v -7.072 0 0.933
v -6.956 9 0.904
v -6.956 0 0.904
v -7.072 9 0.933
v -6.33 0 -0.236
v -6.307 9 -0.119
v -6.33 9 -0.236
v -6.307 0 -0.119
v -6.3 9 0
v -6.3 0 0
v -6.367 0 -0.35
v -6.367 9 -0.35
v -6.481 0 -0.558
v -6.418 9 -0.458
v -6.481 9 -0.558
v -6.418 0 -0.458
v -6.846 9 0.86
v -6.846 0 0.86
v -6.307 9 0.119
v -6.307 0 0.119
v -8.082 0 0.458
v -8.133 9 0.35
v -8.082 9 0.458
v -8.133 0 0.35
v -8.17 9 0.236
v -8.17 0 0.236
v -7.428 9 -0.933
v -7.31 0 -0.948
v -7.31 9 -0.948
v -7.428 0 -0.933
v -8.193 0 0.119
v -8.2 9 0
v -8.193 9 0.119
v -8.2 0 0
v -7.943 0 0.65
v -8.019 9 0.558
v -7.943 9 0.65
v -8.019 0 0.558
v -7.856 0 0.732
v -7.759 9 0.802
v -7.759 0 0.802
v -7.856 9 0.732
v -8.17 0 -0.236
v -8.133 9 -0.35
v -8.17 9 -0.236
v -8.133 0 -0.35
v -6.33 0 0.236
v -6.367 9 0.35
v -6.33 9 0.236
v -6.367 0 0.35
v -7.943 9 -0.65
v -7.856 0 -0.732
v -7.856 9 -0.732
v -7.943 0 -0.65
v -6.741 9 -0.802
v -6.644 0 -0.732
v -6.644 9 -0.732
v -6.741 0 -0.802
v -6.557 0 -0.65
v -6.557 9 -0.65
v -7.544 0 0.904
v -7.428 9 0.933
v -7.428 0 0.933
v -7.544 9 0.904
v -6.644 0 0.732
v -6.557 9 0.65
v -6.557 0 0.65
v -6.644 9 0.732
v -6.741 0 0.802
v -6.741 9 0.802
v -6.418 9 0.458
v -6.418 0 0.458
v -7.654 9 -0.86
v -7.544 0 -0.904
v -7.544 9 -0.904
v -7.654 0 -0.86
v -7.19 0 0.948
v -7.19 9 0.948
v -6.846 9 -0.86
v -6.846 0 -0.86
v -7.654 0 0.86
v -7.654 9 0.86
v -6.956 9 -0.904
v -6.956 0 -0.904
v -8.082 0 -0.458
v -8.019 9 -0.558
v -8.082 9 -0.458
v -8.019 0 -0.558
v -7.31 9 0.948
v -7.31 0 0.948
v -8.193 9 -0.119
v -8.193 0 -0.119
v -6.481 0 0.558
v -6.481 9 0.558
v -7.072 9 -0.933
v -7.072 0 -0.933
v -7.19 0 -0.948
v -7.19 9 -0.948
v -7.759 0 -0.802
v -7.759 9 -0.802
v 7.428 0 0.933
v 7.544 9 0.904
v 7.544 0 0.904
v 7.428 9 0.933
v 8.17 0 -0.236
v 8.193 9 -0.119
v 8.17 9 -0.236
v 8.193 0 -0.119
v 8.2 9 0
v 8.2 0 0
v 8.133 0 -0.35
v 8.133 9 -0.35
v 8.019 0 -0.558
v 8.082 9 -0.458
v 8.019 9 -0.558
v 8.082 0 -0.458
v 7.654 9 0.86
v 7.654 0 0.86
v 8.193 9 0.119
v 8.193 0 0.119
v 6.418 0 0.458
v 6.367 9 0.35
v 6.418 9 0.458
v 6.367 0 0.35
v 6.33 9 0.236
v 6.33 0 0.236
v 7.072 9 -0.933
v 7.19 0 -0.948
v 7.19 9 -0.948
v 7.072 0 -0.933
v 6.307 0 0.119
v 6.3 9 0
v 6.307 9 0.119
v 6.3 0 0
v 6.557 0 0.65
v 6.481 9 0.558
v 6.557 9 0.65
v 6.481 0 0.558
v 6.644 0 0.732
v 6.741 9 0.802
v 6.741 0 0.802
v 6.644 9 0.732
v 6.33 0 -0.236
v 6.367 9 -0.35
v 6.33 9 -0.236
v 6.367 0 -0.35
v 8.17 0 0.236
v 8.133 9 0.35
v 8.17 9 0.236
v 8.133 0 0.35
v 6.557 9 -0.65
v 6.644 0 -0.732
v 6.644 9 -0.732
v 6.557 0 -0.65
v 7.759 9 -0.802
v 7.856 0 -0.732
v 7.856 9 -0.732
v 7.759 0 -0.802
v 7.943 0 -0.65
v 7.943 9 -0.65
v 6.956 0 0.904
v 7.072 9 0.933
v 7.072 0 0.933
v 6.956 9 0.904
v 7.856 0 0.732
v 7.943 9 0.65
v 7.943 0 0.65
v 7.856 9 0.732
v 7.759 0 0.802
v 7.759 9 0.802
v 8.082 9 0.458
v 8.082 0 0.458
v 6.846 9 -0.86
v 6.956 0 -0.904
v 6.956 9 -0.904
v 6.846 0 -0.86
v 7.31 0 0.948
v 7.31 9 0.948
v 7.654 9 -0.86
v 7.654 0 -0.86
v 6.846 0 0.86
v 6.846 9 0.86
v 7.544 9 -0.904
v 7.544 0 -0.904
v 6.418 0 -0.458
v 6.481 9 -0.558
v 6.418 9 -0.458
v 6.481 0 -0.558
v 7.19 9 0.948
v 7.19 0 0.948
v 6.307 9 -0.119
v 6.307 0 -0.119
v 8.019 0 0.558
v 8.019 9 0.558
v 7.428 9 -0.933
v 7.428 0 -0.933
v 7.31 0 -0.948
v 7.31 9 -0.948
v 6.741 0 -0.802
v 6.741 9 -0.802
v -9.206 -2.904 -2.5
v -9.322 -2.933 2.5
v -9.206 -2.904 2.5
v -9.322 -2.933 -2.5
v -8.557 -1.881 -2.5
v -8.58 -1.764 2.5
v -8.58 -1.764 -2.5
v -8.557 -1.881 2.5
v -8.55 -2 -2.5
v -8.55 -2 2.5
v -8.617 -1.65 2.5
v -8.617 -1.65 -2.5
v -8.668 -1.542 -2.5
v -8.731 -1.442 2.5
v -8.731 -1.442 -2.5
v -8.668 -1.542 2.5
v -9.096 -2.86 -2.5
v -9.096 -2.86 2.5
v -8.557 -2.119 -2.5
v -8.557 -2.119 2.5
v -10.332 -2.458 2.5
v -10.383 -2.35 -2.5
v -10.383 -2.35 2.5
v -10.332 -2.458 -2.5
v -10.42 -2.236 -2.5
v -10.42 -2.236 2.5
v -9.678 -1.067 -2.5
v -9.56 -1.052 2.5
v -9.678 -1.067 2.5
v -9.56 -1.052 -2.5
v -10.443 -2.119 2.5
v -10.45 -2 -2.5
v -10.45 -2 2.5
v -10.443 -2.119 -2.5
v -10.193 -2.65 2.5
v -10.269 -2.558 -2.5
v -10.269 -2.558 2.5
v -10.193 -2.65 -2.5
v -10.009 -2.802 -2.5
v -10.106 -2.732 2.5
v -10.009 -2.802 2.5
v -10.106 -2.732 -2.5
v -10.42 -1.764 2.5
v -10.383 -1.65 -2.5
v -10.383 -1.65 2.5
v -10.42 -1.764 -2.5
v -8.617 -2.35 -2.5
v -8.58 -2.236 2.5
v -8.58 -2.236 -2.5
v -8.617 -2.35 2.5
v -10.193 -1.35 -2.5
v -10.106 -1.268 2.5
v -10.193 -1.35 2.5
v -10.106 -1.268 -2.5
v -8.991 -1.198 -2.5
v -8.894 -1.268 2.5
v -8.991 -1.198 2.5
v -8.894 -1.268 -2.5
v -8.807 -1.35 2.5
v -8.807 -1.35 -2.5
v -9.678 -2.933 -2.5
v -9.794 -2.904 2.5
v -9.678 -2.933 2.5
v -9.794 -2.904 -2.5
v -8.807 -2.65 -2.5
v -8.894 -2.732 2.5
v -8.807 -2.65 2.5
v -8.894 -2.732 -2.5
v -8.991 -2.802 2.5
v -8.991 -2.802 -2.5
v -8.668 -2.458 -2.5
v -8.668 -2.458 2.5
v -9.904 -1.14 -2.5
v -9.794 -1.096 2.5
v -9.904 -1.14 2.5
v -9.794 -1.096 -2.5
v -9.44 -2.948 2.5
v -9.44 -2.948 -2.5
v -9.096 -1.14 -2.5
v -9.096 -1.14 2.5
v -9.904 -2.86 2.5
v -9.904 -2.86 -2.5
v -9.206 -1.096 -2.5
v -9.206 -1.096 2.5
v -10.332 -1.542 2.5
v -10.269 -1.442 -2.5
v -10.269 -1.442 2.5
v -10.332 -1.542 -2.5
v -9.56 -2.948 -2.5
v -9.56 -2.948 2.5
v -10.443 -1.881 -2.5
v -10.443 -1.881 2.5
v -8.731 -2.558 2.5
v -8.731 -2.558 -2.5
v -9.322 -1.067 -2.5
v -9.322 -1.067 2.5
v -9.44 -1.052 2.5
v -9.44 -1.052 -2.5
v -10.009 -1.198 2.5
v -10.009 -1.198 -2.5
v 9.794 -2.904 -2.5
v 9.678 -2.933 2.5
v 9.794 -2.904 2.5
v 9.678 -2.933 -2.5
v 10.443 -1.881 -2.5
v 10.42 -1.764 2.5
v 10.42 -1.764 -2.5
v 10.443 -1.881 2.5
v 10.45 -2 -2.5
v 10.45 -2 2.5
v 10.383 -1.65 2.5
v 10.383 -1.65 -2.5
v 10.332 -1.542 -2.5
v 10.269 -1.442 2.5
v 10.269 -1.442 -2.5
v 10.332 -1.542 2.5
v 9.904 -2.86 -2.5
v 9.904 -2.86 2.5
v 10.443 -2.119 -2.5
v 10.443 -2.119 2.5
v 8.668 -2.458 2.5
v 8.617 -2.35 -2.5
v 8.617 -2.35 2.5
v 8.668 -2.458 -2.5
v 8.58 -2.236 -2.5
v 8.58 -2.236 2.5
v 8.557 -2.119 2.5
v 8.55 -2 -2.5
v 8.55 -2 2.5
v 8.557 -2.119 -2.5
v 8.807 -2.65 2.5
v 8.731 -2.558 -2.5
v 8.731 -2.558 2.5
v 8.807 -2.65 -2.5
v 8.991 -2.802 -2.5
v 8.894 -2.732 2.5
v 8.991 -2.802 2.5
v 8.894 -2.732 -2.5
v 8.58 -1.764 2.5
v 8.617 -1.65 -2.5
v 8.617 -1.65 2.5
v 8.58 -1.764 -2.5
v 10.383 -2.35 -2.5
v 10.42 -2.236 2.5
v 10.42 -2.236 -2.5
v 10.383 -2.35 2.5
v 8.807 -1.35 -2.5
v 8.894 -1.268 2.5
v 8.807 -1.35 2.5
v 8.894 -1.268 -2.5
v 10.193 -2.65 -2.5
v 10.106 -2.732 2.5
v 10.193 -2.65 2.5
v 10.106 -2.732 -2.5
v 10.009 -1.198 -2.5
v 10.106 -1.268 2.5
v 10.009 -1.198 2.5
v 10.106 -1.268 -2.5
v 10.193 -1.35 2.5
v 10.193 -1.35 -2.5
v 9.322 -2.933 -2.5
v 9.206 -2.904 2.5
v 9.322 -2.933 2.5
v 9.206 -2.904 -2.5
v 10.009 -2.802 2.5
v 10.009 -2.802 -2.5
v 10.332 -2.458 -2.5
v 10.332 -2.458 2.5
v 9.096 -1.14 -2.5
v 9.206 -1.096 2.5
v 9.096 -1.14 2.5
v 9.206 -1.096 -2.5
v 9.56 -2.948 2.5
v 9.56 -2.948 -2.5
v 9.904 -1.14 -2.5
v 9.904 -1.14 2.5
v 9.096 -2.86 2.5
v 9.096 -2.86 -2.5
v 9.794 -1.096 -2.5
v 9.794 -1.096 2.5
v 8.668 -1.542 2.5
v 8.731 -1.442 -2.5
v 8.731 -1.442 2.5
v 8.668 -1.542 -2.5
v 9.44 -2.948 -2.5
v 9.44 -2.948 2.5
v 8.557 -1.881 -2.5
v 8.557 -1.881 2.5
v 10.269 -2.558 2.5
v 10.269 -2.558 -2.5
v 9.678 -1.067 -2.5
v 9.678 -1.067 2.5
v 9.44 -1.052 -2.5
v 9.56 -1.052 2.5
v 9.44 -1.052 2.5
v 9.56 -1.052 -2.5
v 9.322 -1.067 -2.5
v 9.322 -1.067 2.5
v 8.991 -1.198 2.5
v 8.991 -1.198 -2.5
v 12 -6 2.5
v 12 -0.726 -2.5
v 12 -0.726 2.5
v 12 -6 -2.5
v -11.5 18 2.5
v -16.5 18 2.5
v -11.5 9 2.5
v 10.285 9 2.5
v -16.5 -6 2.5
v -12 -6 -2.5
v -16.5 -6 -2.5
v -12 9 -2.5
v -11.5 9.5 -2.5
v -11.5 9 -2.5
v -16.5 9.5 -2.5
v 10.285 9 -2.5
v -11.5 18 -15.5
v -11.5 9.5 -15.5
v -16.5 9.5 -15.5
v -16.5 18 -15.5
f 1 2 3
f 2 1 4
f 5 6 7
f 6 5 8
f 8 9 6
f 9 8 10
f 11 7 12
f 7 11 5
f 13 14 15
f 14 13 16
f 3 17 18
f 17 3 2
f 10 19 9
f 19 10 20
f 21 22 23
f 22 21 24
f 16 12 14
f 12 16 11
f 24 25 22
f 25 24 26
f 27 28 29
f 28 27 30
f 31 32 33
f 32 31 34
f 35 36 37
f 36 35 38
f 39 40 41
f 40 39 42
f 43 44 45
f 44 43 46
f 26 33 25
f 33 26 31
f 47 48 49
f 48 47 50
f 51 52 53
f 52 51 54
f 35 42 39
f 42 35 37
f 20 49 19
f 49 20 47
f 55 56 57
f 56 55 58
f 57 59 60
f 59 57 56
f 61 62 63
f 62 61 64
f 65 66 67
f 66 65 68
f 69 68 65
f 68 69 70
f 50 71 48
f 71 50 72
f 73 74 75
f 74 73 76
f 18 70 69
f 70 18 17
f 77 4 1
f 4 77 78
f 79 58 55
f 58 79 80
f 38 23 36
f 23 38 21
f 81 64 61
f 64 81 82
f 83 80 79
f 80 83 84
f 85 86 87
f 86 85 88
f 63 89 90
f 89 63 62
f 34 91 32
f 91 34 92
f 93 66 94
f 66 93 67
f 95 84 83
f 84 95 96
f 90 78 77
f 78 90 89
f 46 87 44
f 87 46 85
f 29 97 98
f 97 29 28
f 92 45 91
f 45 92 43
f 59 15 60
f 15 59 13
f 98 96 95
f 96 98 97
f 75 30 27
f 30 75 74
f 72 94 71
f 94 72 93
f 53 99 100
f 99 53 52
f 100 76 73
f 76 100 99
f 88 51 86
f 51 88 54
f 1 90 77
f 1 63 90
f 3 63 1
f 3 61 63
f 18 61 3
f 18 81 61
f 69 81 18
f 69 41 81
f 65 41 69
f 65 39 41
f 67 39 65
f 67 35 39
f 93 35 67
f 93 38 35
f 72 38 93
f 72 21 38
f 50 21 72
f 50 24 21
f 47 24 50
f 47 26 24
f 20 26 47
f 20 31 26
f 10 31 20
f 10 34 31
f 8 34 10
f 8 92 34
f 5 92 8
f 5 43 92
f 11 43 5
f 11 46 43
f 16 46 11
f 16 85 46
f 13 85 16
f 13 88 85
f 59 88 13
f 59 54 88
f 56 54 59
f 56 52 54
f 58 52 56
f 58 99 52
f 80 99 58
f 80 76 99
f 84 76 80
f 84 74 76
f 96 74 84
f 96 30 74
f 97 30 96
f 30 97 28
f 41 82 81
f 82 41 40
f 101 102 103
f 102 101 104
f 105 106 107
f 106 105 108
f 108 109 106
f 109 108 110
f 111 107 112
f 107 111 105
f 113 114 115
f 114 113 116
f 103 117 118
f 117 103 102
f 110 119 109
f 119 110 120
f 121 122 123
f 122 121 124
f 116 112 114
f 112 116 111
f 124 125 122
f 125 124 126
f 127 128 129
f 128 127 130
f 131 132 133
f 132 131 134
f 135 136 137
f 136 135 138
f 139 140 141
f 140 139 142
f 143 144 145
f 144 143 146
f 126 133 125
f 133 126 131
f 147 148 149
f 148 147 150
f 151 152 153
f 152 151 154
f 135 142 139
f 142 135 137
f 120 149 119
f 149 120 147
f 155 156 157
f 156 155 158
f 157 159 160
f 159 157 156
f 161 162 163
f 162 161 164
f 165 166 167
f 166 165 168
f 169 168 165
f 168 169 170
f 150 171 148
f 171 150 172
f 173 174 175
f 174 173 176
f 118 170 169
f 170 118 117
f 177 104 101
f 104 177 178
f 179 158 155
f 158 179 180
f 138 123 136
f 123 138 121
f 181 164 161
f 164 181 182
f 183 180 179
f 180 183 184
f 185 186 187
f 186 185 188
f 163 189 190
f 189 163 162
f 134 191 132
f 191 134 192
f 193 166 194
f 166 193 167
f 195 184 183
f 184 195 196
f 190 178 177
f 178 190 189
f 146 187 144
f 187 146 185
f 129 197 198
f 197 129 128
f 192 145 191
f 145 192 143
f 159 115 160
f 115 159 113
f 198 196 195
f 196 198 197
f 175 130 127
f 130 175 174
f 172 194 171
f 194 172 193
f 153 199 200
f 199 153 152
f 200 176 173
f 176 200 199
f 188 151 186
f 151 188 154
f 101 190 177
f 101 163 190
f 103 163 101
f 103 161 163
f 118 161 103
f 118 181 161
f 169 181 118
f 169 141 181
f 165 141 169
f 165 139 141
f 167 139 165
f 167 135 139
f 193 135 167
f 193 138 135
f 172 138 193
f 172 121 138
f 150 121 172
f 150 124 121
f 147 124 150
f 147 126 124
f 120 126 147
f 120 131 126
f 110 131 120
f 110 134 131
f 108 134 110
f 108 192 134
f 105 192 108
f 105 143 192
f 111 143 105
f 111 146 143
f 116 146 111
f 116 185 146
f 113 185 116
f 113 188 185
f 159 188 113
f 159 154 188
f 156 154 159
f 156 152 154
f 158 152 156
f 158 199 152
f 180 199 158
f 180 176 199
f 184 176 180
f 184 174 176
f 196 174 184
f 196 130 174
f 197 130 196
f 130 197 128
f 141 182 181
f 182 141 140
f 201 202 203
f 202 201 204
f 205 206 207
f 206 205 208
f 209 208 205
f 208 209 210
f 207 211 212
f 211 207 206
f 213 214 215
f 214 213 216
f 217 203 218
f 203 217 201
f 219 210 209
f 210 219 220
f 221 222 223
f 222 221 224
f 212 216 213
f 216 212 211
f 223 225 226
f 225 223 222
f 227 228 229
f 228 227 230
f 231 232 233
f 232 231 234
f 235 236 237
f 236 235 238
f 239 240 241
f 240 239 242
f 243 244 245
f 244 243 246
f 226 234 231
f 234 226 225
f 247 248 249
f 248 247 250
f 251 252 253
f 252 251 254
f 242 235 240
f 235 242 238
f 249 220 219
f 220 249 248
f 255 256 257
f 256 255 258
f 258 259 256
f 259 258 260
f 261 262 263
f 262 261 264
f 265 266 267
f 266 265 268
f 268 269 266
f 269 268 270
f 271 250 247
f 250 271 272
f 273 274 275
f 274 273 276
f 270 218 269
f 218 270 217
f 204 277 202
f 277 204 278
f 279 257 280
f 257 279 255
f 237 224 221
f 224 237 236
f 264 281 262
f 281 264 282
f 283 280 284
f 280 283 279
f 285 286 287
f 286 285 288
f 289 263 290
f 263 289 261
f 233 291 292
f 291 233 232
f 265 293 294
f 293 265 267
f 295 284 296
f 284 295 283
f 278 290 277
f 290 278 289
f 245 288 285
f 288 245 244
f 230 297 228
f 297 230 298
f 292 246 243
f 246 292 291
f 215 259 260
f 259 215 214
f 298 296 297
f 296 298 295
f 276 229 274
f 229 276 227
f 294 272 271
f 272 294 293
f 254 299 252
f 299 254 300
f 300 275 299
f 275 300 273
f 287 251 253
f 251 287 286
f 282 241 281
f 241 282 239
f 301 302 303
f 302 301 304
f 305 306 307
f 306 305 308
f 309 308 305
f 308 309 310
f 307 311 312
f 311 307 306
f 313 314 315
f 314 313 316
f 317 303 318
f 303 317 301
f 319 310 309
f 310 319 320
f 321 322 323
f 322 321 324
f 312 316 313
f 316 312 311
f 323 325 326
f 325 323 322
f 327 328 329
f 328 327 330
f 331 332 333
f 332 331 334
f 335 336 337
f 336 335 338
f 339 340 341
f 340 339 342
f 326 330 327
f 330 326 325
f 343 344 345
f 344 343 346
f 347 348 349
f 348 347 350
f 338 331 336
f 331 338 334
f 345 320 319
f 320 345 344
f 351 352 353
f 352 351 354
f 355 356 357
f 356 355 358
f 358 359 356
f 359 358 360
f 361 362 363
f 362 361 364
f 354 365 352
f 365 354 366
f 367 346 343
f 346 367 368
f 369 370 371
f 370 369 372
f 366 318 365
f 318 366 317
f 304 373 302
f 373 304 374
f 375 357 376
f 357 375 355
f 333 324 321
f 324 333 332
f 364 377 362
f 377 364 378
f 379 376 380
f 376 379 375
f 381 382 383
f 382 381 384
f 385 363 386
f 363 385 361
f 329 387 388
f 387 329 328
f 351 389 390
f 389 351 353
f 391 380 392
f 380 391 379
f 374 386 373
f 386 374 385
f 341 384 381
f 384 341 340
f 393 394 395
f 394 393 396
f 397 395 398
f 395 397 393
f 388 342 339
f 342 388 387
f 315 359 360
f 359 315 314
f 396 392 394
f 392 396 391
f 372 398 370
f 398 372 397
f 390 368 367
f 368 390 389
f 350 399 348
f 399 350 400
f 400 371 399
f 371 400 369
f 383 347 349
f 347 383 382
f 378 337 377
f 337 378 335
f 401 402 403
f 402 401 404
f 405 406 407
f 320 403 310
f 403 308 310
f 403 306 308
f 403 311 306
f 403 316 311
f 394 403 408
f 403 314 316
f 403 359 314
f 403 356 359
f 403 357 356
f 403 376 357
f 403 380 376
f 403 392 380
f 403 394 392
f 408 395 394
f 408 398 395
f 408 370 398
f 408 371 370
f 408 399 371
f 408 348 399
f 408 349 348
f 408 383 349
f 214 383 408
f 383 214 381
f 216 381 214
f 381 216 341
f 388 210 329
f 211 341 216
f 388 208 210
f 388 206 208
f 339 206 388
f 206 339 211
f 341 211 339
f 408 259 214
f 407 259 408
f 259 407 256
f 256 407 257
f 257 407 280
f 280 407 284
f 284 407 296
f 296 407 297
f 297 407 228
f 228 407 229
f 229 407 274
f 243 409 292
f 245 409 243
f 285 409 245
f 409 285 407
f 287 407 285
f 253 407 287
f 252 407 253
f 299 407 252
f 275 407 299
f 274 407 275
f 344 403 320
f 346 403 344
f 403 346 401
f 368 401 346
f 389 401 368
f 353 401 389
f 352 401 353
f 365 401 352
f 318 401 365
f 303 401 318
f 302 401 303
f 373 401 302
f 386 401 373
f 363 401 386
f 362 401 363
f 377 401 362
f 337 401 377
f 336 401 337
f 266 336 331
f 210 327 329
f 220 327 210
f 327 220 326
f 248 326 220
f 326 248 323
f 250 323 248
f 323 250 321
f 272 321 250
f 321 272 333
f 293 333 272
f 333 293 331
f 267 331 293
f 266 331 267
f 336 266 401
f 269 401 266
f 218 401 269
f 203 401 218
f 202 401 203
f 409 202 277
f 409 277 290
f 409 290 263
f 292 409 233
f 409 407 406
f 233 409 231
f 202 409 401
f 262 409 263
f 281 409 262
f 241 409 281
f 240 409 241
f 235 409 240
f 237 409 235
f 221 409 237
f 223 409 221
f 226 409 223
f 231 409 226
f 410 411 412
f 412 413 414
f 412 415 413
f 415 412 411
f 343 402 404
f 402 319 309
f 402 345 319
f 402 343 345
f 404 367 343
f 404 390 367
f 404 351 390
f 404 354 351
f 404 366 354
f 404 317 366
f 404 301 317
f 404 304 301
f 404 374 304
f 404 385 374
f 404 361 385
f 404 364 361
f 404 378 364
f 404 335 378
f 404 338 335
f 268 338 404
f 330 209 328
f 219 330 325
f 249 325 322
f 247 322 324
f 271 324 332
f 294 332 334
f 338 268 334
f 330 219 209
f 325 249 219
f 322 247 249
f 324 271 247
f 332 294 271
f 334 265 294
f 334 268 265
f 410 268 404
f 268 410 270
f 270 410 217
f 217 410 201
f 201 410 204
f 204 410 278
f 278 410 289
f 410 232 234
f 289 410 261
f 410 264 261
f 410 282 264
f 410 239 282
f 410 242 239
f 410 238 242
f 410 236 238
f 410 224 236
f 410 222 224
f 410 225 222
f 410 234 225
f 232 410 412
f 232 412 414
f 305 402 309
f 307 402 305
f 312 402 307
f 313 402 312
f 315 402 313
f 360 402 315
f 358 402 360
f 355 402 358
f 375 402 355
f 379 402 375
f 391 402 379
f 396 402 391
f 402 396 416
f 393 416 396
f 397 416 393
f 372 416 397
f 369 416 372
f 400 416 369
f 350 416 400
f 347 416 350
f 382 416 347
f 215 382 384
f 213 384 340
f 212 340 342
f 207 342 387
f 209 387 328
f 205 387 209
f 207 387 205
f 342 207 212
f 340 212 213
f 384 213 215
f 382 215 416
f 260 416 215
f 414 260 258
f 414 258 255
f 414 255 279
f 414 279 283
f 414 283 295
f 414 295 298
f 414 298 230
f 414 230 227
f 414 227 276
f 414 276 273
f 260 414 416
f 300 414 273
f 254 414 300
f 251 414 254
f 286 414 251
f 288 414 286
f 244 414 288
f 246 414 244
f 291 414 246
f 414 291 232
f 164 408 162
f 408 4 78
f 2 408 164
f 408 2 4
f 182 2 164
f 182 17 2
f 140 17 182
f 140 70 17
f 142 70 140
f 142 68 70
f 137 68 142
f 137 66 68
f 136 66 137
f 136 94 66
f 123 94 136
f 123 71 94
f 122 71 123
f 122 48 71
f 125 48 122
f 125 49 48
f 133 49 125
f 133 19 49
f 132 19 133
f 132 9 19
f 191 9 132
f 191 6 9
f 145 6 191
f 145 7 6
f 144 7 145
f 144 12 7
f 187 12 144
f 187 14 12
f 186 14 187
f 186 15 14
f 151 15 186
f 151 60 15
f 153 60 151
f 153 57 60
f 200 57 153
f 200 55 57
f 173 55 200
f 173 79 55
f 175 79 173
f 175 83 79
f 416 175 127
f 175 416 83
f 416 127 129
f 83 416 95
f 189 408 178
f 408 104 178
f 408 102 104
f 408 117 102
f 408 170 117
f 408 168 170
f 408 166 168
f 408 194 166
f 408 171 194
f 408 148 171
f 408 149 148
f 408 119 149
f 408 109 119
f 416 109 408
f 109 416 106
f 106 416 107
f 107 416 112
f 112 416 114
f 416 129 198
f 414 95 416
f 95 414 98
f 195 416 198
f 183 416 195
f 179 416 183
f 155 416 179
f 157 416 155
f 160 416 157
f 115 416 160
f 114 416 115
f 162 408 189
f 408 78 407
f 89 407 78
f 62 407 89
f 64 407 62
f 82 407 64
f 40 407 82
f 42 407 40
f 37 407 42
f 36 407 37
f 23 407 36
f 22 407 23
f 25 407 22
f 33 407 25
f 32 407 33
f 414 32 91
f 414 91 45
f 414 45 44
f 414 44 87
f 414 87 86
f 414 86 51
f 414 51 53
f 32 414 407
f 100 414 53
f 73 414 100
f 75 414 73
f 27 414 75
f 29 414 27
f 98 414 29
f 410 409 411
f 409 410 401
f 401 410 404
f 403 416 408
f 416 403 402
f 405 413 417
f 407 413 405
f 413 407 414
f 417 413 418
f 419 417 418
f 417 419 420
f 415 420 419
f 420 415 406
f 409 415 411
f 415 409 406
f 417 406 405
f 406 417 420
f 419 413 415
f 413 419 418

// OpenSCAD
$fn = 50;

difference() {
    base(false);
}

difference() {
    translate([-14, 6, -6.5]) cube([5, 24, 18], true);
    translate([-14, -1.5, -11.5]) cube([6, 22, 18], true);
}



module base(e) {
    difference() {
        translate([0, 1.5, 0]) cube([24, 15, 5], true);
        
        rotate([-90, 0, 0]) #translate([-6.25, 0, 0]) {
            translate([-1, 0, 0]) cylinder(d = 1.9, h = 10);
            translate([13.5, 0, 0]) cylinder(d = 1.9, h = 10);
        }
        #translate([-6, -2, -3]) {
            translate([-3.5, 0, 0]) cylinder(d = 1.9, h = 10);
            translate([15.5, 0, 0]) cylinder(d = 1.9, h = 10);
        }
        //translate([-13, 8, 0]) rotate([0, 0, -10]) cube([5, 20, 10], true);
        translate([13, 8, 0]) rotate([0, 0, 10]) cube([5, 20, 10], true);
    }
}
//translate([4, 4, 4]) #cube([12.5, 1, 1]);
//translate([0, -6, 4]) #cube([17, 1, 1],true);
//translate([-14, 13.5, 4]) #cube([1, 9, 10],true);
